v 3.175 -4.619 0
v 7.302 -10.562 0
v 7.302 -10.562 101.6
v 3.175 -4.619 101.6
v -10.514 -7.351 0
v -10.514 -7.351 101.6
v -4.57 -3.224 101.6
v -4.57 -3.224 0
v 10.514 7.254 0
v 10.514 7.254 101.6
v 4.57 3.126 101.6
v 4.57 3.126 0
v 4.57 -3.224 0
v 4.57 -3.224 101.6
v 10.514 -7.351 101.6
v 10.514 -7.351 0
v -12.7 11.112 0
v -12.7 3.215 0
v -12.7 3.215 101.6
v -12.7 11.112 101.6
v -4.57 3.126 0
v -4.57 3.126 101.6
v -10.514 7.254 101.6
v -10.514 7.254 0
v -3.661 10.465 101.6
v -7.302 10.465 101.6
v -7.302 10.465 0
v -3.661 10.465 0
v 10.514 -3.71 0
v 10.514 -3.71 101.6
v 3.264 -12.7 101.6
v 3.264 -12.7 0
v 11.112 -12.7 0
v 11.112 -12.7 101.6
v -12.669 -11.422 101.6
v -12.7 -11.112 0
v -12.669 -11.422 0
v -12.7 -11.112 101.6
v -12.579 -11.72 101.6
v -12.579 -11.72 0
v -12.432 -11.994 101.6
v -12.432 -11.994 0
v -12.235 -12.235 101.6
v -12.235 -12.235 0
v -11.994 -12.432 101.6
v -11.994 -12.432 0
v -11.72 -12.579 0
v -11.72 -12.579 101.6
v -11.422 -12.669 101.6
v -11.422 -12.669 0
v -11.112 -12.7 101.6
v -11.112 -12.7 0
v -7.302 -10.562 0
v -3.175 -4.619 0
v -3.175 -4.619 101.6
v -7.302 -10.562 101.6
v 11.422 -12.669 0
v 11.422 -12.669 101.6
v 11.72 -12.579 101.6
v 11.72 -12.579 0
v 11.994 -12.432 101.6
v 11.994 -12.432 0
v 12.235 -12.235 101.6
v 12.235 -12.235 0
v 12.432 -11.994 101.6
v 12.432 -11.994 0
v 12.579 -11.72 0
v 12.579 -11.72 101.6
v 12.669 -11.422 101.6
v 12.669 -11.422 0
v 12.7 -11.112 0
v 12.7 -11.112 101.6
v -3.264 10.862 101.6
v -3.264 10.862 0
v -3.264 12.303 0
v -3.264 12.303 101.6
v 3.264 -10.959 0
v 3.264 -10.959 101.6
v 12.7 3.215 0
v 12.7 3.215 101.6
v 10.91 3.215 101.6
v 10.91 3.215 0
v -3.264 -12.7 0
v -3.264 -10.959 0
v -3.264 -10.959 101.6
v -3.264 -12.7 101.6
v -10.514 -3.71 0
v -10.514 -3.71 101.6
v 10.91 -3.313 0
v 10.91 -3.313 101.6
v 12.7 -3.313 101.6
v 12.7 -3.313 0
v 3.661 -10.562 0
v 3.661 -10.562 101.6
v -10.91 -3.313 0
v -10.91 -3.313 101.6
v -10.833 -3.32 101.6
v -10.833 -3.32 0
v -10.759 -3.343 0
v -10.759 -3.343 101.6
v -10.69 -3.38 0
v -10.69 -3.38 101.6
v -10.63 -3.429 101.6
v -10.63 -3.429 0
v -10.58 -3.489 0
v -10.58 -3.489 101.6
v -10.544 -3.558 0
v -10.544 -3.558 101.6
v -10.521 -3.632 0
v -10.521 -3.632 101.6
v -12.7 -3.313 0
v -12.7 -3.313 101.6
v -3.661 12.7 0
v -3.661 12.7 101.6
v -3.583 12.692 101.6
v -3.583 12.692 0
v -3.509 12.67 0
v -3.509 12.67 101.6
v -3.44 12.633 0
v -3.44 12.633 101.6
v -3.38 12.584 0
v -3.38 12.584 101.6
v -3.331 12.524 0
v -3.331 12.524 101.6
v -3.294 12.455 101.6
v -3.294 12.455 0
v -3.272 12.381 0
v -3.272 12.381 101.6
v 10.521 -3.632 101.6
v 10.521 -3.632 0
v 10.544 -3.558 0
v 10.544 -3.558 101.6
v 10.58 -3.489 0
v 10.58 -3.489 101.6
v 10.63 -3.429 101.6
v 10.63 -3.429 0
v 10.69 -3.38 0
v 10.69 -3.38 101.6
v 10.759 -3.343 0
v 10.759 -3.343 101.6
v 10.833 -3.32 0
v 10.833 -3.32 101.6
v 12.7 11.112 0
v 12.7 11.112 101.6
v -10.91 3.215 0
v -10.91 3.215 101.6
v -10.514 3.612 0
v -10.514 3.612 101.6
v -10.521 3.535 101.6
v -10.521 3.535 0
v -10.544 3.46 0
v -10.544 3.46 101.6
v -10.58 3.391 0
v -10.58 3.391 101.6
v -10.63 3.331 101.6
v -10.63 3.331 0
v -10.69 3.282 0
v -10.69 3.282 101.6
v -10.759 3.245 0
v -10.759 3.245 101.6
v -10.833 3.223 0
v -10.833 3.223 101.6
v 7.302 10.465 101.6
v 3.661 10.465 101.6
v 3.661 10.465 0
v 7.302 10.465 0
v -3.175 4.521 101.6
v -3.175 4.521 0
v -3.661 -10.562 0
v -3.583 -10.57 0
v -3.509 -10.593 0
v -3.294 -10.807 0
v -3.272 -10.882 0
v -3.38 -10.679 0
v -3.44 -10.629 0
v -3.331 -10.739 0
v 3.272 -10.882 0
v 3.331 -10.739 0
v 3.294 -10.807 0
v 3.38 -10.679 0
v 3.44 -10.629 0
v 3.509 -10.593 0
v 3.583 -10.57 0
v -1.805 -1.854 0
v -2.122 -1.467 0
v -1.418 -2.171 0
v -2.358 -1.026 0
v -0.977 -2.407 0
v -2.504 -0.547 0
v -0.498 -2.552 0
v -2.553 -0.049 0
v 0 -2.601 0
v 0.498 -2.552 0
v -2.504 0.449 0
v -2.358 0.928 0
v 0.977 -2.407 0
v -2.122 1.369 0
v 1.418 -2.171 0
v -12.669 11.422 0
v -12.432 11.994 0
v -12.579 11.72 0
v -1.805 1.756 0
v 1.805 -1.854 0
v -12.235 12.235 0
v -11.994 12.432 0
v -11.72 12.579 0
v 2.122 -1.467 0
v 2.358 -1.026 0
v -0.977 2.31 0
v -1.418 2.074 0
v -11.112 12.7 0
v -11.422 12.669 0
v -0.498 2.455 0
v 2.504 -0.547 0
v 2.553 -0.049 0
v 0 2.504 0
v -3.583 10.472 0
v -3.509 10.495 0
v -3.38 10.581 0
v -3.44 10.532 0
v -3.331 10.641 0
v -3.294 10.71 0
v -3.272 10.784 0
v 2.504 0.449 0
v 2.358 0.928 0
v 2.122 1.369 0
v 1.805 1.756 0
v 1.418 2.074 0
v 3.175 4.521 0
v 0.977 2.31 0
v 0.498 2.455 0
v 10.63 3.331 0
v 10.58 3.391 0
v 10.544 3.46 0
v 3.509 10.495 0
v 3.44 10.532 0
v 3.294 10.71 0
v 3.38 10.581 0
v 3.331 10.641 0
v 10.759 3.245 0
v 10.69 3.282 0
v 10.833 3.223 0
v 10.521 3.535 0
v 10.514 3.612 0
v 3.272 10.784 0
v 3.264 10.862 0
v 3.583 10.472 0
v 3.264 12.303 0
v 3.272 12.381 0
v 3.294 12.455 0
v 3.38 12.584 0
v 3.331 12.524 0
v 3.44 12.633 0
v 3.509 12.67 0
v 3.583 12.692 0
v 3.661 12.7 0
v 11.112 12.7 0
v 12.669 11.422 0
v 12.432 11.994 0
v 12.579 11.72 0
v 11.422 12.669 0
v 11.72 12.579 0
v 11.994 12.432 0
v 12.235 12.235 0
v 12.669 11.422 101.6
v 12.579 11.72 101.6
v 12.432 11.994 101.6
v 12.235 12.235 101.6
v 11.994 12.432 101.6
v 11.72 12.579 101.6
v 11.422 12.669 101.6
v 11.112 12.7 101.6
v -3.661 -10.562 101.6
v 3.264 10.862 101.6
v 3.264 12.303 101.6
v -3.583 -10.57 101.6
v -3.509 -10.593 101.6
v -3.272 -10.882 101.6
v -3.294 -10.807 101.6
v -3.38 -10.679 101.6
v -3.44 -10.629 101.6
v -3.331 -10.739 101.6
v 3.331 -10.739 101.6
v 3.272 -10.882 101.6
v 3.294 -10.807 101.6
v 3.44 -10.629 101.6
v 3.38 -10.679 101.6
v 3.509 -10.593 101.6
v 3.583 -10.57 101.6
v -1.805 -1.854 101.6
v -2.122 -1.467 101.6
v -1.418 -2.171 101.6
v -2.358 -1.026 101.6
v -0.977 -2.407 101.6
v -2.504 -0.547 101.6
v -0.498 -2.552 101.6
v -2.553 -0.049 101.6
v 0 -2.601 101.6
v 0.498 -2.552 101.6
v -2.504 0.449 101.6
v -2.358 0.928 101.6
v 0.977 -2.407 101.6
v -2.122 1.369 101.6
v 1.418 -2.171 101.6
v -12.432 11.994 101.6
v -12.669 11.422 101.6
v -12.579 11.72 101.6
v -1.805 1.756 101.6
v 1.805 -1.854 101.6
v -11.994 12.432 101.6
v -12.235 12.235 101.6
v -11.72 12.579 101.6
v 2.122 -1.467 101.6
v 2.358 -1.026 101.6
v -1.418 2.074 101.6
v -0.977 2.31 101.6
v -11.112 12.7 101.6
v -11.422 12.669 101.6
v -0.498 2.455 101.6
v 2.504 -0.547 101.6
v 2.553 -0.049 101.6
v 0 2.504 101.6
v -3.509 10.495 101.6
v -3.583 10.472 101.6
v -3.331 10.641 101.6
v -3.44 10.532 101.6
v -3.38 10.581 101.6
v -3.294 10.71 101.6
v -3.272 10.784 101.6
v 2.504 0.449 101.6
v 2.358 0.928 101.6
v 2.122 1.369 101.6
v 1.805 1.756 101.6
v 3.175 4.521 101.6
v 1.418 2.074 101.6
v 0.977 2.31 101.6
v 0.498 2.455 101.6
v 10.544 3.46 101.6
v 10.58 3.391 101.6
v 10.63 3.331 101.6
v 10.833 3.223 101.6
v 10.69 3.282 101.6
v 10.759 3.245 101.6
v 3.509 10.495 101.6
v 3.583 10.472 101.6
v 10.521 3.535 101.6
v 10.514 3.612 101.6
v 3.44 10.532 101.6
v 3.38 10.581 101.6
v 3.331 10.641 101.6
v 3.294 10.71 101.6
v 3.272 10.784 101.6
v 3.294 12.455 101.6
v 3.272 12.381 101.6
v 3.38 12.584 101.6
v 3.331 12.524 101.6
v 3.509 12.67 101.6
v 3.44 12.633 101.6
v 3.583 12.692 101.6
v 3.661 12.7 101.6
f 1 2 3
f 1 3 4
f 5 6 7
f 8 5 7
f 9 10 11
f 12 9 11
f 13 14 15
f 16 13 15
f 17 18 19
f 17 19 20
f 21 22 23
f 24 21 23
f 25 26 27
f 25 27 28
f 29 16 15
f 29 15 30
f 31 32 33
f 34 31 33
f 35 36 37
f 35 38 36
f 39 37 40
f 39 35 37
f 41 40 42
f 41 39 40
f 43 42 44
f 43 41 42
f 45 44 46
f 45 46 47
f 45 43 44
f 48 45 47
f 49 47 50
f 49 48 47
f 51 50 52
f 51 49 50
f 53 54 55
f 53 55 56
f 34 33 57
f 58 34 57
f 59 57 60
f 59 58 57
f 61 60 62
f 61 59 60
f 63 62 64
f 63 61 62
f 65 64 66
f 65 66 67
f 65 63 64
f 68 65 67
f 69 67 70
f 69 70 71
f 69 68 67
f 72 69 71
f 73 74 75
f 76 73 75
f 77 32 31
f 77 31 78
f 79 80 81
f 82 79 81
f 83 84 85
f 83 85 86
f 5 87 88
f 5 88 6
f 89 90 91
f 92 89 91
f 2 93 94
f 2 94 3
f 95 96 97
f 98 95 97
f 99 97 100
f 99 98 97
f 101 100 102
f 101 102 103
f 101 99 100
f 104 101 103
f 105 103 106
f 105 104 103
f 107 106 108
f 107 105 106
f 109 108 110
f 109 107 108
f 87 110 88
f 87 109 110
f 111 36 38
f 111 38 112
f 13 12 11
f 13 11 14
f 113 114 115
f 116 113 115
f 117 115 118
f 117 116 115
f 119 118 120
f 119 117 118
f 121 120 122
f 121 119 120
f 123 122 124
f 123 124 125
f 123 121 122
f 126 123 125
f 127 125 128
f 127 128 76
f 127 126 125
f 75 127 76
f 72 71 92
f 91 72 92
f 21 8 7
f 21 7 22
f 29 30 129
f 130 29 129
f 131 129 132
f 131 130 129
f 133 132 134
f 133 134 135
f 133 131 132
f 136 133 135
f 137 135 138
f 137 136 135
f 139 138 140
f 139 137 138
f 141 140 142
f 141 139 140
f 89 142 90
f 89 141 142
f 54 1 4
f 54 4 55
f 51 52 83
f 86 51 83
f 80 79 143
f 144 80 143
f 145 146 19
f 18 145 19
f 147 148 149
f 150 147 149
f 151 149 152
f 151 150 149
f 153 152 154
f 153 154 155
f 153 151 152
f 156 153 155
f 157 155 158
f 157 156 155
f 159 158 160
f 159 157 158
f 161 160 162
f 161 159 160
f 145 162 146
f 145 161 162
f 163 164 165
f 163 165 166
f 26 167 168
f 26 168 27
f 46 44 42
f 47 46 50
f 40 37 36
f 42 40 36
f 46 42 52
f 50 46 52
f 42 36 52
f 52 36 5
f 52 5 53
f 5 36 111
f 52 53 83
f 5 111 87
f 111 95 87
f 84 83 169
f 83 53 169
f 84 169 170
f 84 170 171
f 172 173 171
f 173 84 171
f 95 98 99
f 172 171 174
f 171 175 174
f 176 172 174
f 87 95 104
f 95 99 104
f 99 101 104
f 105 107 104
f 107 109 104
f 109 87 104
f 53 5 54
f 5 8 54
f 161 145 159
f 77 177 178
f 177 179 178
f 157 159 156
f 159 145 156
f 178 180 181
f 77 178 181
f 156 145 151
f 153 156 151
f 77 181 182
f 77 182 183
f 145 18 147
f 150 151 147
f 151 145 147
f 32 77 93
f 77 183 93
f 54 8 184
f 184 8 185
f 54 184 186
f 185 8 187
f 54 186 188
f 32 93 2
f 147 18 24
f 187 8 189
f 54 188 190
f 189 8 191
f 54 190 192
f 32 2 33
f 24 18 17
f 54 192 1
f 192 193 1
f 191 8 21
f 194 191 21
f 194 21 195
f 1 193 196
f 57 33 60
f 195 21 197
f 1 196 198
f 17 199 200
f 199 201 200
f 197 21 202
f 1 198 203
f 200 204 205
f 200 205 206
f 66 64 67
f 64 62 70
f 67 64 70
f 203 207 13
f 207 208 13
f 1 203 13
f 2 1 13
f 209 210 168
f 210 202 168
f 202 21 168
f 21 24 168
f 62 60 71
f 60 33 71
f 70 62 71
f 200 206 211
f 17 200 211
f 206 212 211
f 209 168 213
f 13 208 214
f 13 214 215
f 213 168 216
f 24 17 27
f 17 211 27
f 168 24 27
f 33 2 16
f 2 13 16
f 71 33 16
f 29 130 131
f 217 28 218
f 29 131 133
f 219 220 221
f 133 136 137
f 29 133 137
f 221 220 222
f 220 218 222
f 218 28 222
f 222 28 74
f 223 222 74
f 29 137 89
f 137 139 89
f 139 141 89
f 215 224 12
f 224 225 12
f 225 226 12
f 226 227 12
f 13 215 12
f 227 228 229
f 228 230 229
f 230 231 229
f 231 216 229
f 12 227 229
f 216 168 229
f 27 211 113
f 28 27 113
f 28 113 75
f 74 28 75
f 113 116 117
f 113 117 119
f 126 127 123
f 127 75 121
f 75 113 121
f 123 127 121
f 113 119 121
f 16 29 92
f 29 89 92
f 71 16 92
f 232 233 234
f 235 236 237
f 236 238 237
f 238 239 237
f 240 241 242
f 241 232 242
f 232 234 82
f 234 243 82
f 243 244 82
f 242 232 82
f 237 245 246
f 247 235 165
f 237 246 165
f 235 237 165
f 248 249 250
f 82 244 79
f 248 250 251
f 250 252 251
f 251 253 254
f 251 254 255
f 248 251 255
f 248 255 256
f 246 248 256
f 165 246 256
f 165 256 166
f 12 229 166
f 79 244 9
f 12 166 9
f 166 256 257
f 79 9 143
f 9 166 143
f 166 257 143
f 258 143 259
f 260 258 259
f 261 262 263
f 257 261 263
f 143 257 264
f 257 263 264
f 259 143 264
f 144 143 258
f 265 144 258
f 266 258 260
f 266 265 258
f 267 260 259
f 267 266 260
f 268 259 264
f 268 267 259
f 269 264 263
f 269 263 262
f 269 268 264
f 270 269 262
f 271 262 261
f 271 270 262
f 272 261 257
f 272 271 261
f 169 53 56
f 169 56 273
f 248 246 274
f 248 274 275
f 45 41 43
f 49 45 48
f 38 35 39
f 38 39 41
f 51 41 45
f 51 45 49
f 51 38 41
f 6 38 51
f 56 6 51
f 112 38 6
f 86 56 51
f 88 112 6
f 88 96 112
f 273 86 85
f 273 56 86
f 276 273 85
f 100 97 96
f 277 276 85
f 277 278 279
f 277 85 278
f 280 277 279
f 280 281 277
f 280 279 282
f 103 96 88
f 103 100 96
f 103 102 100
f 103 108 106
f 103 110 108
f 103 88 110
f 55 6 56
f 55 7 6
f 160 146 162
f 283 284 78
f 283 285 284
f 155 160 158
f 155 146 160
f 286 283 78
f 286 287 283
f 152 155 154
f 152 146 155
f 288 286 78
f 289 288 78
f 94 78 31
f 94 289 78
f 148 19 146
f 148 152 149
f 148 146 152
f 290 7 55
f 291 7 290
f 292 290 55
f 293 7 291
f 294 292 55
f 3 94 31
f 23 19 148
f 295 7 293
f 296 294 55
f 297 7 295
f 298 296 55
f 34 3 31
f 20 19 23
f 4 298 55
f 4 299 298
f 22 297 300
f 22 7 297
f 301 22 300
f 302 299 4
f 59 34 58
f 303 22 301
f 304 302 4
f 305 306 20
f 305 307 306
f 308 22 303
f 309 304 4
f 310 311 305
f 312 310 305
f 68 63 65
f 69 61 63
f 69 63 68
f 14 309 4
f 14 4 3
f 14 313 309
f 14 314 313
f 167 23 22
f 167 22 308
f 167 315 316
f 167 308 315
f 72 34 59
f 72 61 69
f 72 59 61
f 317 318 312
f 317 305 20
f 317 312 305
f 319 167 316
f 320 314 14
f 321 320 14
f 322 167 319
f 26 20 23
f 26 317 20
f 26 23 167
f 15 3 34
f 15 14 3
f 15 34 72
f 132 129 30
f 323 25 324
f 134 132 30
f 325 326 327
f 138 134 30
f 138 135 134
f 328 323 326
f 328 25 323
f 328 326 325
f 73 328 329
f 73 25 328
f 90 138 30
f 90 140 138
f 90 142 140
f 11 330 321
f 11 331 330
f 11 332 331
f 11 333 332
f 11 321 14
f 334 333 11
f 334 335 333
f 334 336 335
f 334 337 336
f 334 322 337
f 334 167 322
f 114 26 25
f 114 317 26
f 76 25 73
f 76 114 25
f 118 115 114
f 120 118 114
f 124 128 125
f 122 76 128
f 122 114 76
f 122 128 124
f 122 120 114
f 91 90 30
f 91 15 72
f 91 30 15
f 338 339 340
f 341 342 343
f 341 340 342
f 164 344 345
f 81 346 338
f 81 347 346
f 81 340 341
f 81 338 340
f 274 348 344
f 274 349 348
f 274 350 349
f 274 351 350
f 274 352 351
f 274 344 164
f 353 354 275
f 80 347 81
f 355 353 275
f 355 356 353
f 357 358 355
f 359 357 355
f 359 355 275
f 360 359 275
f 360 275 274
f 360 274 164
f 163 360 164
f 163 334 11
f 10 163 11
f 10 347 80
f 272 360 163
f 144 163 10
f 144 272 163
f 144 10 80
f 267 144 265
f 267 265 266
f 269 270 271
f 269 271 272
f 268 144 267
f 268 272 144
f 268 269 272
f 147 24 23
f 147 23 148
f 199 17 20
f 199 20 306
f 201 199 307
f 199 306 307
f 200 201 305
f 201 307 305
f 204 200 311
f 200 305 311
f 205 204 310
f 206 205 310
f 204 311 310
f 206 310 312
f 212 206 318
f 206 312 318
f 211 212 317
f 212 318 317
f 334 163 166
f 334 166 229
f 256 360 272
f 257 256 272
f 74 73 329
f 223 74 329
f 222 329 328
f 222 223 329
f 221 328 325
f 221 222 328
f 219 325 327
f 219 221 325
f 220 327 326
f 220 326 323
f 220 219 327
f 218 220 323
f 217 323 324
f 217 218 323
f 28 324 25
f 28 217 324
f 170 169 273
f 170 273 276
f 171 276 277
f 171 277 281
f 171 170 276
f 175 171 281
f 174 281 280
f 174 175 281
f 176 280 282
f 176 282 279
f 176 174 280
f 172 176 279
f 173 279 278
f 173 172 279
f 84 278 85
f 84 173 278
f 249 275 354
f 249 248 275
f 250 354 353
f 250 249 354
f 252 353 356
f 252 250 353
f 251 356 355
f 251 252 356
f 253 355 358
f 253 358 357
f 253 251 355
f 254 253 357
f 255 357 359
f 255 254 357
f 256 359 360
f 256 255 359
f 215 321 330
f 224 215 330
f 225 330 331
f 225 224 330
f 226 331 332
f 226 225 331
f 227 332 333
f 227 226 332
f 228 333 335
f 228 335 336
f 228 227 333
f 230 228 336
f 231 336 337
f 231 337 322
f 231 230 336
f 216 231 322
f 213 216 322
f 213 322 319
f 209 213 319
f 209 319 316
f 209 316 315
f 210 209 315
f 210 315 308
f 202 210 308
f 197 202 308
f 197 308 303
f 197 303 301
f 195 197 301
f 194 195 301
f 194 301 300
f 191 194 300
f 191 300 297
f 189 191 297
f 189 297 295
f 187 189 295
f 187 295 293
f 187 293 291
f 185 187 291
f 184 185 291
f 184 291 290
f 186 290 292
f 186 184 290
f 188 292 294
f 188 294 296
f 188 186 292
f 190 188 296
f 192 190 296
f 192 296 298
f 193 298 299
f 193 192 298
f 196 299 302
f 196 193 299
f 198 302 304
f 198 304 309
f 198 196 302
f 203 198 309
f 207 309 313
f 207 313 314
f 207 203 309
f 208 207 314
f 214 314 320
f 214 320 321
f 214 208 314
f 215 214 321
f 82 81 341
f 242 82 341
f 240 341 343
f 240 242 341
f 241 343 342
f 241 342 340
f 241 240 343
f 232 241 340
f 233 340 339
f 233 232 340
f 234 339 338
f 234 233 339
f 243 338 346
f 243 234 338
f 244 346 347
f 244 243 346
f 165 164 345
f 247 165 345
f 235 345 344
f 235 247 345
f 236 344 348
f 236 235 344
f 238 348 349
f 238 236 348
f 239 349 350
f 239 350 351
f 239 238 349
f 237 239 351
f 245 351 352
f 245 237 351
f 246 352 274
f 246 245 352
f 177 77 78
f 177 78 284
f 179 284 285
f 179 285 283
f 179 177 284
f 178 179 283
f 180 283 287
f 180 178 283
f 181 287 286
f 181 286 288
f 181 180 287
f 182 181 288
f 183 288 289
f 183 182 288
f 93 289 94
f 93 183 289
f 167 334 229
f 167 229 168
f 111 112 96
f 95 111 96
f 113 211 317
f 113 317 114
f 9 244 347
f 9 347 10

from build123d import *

# Parameters (mm, degrees)
SKETCH1_W                   = 25.4
SKETCH1_H                   = 25.4
BOSS_EXTRUDE1_DEPTH         = 101.6
FILLET1_R                   = 1.5875
HOLE1_OUTLINE_R             = 2.5527
HOLE1_DEPTH                 = 101.6
SKETCH7_W                   = 6.5278
SKETCH7_H                   = 2.2352
CUT_EXTRUDE2_DEPTH          = 101.6
FILLET4_R                   = 0.396875
CIRPATTERN2_DEPTH           = 101.6
F_1_4_20_TAPPED_HOLE1_D     = 5.1054
F_1_4_20_TAPPED_HOLE1_DEPTH = 6.35
F_1_4_20_TAPPED_HOLE1_TIP   = 1.533816902


# Read off the part's stored shape, not the designer's step: Hole1, CirPattern2
with BuildPart() as part:
    # Sketch1 → Boss-Extrude1 (new body)
    with BuildSketch(Plane.XY):
        Rectangle(SKETCH1_W, SKETCH1_H)
    extrude(amount=BOSS_EXTRUDE1_DEPTH)

    # Fillet1
    fillet1_edges = [part.edges().sort_by_distance(p)[0] for p in [
        (12.7, -12.7, 50.8),
        (-12.7, -12.7, 50.8),
        (-12.7, 12.7, 50.8),
        (12.7, 12.7, 50.8),
    ]]
    fillet(fillet1_edges, radius=FILLET1_R)

    # Hole1 outline → Hole1 (cut)
    with BuildSketch(Plane.XY):
        with Locations((0, -0.048792482)):
            Circle(HOLE1_OUTLINE_R)
    extrude(amount=HOLE1_DEPTH, mode=Mode.SUBTRACT)

    # Sketch7 → Cut-Extrude2 (cut)
    with BuildSketch(Plane.XY.offset(101.6)):
        with Locations((0, 11.5824)):
            Rectangle(SKETCH7_W, SKETCH7_H)
        Polygon((-3.175, 4.5212), (-7.3025, 10.4648), (7.3025, 10.4648), (3.175, 4.5212), align=None)
    extrude(amount=-CUT_EXTRUDE2_DEPTH, mode=Mode.SUBTRACT)

    # Fillet4
    fillet4_edges = [part.edges().sort_by_distance(p)[0] for p in [
        (-3.2639, 10.4648, 50.8),
        (-3.2639, 12.7, 50.8),
        (3.2639, 12.7, 50.8),
        (3.2639, 10.4648, 50.8),
    ]]
    fillet(fillet4_edges, radius=FILLET4_R)

    # CirPattern2 outline → CirPattern2 (cut)
    with BuildSketch(Plane.XY):
        with BuildLine():
            ThreePointArc((-3.660775, -10.562384964), (-3.380141996, -10.67862696), (-3.2639, -10.959259964))
            Line((-3.2639, -10.959259964), (-3.2639, -12.7))
            Line((-3.2639, -12.7), (3.2639, -12.7))
            Line((3.2639, -12.7), (3.2639, -10.959259964))
            ThreePointArc((3.2639, -10.959259964), (3.380141996, -10.67862696), (3.660775, -10.562384964))
            Line((3.660775, -10.562384964), (7.3025, -10.562384964))
            Line((7.3025, -10.562384964), (3.175, -4.618784964))
            Line((3.175, -4.618784964), (-3.175, -4.618784964))
            Line((-3.175, -4.618784964), (-7.3025, -10.562384964))
            Line((-7.3025, -10.562384964), (-3.660775, -10.562384964))
        make_face()
        with BuildLine():
            Line((-12.7, -3.312692482), (-10.910467482, -3.312692482))
            ThreePointArc((-10.910467482, -3.312692482), (-10.629834478, -3.428934478), (-10.513592482, -3.709567482))
            Line((-10.513592482, -3.709567482), (-10.513592482, -7.351292482))
            Line((-10.513592482, -7.351292482), (-4.569992482, -3.223792482))
            Line((-4.569992482, -3.223792482), (-4.569992482, 3.126207518))
            Line((-4.569992482, 3.126207518), (-10.513592482, 7.253707518))
            Line((-10.513592482, 7.253707518), (-10.513592482, 3.611982518))
            ThreePointArc((-10.513592482, 3.611982518), (-10.629834478, 3.331349514), (-10.910467482, 3.215107518))
            Line((-10.910467482, 3.215107518), (-12.7, 3.215107518))
            Line((-12.7, 3.215107518), (-12.7, -3.312692482))
        make_face()
        with BuildLine():
            ThreePointArc((10.513592482, -3.709567482), (10.629834478, -3.428934478), (10.910467482, -3.312692482))
            Line((10.910467482, -3.312692482), (12.7, -3.312692482))
            Line((12.7, -3.312692482), (12.7, 3.215107518))
            Line((12.7, 3.215107518), (10.910467482, 3.215107518))
            ThreePointArc((10.910467482, 3.215107518), (10.629834478, 3.331349514), (10.513592482, 3.611982518))
            Line((10.513592482, 3.611982518), (10.513592482, 7.253707518))
            Line((10.513592482, 7.253707518), (4.569992482, 3.126207518))
            Line((4.569992482, 3.126207518), (4.569992482, -3.223792482))
            Line((4.569992482, -3.223792482), (10.513592482, -7.351292482))
            Line((10.513592482, -7.351292482), (10.513592482, -3.709567482))
        make_face()
    extrude(amount=CIRPATTERN2_DEPTH, mode=Mode.SUBTRACT)

    # 1/4-20 Tapped Hole1
    with Locations(Plane(origin=(0, -0.048792482, 101.6), x_dir=(1, 0, 0), z_dir=(0, 0, 1))):
        with Locations((0, 0)):
            Hole(F_1_4_20_TAPPED_HOLE1_D / 2, depth=F_1_4_20_TAPPED_HOLE1_DEPTH)
            with Locations((0, 0, -(F_1_4_20_TAPPED_HOLE1_DEPTH + F_1_4_20_TAPPED_HOLE1_TIP / 2))):  # 118° drill point
                Cone(0, F_1_4_20_TAPPED_HOLE1_D / 2, F_1_4_20_TAPPED_HOLE1_TIP, mode=Mode.SUBTRACT)


solid = part.part
